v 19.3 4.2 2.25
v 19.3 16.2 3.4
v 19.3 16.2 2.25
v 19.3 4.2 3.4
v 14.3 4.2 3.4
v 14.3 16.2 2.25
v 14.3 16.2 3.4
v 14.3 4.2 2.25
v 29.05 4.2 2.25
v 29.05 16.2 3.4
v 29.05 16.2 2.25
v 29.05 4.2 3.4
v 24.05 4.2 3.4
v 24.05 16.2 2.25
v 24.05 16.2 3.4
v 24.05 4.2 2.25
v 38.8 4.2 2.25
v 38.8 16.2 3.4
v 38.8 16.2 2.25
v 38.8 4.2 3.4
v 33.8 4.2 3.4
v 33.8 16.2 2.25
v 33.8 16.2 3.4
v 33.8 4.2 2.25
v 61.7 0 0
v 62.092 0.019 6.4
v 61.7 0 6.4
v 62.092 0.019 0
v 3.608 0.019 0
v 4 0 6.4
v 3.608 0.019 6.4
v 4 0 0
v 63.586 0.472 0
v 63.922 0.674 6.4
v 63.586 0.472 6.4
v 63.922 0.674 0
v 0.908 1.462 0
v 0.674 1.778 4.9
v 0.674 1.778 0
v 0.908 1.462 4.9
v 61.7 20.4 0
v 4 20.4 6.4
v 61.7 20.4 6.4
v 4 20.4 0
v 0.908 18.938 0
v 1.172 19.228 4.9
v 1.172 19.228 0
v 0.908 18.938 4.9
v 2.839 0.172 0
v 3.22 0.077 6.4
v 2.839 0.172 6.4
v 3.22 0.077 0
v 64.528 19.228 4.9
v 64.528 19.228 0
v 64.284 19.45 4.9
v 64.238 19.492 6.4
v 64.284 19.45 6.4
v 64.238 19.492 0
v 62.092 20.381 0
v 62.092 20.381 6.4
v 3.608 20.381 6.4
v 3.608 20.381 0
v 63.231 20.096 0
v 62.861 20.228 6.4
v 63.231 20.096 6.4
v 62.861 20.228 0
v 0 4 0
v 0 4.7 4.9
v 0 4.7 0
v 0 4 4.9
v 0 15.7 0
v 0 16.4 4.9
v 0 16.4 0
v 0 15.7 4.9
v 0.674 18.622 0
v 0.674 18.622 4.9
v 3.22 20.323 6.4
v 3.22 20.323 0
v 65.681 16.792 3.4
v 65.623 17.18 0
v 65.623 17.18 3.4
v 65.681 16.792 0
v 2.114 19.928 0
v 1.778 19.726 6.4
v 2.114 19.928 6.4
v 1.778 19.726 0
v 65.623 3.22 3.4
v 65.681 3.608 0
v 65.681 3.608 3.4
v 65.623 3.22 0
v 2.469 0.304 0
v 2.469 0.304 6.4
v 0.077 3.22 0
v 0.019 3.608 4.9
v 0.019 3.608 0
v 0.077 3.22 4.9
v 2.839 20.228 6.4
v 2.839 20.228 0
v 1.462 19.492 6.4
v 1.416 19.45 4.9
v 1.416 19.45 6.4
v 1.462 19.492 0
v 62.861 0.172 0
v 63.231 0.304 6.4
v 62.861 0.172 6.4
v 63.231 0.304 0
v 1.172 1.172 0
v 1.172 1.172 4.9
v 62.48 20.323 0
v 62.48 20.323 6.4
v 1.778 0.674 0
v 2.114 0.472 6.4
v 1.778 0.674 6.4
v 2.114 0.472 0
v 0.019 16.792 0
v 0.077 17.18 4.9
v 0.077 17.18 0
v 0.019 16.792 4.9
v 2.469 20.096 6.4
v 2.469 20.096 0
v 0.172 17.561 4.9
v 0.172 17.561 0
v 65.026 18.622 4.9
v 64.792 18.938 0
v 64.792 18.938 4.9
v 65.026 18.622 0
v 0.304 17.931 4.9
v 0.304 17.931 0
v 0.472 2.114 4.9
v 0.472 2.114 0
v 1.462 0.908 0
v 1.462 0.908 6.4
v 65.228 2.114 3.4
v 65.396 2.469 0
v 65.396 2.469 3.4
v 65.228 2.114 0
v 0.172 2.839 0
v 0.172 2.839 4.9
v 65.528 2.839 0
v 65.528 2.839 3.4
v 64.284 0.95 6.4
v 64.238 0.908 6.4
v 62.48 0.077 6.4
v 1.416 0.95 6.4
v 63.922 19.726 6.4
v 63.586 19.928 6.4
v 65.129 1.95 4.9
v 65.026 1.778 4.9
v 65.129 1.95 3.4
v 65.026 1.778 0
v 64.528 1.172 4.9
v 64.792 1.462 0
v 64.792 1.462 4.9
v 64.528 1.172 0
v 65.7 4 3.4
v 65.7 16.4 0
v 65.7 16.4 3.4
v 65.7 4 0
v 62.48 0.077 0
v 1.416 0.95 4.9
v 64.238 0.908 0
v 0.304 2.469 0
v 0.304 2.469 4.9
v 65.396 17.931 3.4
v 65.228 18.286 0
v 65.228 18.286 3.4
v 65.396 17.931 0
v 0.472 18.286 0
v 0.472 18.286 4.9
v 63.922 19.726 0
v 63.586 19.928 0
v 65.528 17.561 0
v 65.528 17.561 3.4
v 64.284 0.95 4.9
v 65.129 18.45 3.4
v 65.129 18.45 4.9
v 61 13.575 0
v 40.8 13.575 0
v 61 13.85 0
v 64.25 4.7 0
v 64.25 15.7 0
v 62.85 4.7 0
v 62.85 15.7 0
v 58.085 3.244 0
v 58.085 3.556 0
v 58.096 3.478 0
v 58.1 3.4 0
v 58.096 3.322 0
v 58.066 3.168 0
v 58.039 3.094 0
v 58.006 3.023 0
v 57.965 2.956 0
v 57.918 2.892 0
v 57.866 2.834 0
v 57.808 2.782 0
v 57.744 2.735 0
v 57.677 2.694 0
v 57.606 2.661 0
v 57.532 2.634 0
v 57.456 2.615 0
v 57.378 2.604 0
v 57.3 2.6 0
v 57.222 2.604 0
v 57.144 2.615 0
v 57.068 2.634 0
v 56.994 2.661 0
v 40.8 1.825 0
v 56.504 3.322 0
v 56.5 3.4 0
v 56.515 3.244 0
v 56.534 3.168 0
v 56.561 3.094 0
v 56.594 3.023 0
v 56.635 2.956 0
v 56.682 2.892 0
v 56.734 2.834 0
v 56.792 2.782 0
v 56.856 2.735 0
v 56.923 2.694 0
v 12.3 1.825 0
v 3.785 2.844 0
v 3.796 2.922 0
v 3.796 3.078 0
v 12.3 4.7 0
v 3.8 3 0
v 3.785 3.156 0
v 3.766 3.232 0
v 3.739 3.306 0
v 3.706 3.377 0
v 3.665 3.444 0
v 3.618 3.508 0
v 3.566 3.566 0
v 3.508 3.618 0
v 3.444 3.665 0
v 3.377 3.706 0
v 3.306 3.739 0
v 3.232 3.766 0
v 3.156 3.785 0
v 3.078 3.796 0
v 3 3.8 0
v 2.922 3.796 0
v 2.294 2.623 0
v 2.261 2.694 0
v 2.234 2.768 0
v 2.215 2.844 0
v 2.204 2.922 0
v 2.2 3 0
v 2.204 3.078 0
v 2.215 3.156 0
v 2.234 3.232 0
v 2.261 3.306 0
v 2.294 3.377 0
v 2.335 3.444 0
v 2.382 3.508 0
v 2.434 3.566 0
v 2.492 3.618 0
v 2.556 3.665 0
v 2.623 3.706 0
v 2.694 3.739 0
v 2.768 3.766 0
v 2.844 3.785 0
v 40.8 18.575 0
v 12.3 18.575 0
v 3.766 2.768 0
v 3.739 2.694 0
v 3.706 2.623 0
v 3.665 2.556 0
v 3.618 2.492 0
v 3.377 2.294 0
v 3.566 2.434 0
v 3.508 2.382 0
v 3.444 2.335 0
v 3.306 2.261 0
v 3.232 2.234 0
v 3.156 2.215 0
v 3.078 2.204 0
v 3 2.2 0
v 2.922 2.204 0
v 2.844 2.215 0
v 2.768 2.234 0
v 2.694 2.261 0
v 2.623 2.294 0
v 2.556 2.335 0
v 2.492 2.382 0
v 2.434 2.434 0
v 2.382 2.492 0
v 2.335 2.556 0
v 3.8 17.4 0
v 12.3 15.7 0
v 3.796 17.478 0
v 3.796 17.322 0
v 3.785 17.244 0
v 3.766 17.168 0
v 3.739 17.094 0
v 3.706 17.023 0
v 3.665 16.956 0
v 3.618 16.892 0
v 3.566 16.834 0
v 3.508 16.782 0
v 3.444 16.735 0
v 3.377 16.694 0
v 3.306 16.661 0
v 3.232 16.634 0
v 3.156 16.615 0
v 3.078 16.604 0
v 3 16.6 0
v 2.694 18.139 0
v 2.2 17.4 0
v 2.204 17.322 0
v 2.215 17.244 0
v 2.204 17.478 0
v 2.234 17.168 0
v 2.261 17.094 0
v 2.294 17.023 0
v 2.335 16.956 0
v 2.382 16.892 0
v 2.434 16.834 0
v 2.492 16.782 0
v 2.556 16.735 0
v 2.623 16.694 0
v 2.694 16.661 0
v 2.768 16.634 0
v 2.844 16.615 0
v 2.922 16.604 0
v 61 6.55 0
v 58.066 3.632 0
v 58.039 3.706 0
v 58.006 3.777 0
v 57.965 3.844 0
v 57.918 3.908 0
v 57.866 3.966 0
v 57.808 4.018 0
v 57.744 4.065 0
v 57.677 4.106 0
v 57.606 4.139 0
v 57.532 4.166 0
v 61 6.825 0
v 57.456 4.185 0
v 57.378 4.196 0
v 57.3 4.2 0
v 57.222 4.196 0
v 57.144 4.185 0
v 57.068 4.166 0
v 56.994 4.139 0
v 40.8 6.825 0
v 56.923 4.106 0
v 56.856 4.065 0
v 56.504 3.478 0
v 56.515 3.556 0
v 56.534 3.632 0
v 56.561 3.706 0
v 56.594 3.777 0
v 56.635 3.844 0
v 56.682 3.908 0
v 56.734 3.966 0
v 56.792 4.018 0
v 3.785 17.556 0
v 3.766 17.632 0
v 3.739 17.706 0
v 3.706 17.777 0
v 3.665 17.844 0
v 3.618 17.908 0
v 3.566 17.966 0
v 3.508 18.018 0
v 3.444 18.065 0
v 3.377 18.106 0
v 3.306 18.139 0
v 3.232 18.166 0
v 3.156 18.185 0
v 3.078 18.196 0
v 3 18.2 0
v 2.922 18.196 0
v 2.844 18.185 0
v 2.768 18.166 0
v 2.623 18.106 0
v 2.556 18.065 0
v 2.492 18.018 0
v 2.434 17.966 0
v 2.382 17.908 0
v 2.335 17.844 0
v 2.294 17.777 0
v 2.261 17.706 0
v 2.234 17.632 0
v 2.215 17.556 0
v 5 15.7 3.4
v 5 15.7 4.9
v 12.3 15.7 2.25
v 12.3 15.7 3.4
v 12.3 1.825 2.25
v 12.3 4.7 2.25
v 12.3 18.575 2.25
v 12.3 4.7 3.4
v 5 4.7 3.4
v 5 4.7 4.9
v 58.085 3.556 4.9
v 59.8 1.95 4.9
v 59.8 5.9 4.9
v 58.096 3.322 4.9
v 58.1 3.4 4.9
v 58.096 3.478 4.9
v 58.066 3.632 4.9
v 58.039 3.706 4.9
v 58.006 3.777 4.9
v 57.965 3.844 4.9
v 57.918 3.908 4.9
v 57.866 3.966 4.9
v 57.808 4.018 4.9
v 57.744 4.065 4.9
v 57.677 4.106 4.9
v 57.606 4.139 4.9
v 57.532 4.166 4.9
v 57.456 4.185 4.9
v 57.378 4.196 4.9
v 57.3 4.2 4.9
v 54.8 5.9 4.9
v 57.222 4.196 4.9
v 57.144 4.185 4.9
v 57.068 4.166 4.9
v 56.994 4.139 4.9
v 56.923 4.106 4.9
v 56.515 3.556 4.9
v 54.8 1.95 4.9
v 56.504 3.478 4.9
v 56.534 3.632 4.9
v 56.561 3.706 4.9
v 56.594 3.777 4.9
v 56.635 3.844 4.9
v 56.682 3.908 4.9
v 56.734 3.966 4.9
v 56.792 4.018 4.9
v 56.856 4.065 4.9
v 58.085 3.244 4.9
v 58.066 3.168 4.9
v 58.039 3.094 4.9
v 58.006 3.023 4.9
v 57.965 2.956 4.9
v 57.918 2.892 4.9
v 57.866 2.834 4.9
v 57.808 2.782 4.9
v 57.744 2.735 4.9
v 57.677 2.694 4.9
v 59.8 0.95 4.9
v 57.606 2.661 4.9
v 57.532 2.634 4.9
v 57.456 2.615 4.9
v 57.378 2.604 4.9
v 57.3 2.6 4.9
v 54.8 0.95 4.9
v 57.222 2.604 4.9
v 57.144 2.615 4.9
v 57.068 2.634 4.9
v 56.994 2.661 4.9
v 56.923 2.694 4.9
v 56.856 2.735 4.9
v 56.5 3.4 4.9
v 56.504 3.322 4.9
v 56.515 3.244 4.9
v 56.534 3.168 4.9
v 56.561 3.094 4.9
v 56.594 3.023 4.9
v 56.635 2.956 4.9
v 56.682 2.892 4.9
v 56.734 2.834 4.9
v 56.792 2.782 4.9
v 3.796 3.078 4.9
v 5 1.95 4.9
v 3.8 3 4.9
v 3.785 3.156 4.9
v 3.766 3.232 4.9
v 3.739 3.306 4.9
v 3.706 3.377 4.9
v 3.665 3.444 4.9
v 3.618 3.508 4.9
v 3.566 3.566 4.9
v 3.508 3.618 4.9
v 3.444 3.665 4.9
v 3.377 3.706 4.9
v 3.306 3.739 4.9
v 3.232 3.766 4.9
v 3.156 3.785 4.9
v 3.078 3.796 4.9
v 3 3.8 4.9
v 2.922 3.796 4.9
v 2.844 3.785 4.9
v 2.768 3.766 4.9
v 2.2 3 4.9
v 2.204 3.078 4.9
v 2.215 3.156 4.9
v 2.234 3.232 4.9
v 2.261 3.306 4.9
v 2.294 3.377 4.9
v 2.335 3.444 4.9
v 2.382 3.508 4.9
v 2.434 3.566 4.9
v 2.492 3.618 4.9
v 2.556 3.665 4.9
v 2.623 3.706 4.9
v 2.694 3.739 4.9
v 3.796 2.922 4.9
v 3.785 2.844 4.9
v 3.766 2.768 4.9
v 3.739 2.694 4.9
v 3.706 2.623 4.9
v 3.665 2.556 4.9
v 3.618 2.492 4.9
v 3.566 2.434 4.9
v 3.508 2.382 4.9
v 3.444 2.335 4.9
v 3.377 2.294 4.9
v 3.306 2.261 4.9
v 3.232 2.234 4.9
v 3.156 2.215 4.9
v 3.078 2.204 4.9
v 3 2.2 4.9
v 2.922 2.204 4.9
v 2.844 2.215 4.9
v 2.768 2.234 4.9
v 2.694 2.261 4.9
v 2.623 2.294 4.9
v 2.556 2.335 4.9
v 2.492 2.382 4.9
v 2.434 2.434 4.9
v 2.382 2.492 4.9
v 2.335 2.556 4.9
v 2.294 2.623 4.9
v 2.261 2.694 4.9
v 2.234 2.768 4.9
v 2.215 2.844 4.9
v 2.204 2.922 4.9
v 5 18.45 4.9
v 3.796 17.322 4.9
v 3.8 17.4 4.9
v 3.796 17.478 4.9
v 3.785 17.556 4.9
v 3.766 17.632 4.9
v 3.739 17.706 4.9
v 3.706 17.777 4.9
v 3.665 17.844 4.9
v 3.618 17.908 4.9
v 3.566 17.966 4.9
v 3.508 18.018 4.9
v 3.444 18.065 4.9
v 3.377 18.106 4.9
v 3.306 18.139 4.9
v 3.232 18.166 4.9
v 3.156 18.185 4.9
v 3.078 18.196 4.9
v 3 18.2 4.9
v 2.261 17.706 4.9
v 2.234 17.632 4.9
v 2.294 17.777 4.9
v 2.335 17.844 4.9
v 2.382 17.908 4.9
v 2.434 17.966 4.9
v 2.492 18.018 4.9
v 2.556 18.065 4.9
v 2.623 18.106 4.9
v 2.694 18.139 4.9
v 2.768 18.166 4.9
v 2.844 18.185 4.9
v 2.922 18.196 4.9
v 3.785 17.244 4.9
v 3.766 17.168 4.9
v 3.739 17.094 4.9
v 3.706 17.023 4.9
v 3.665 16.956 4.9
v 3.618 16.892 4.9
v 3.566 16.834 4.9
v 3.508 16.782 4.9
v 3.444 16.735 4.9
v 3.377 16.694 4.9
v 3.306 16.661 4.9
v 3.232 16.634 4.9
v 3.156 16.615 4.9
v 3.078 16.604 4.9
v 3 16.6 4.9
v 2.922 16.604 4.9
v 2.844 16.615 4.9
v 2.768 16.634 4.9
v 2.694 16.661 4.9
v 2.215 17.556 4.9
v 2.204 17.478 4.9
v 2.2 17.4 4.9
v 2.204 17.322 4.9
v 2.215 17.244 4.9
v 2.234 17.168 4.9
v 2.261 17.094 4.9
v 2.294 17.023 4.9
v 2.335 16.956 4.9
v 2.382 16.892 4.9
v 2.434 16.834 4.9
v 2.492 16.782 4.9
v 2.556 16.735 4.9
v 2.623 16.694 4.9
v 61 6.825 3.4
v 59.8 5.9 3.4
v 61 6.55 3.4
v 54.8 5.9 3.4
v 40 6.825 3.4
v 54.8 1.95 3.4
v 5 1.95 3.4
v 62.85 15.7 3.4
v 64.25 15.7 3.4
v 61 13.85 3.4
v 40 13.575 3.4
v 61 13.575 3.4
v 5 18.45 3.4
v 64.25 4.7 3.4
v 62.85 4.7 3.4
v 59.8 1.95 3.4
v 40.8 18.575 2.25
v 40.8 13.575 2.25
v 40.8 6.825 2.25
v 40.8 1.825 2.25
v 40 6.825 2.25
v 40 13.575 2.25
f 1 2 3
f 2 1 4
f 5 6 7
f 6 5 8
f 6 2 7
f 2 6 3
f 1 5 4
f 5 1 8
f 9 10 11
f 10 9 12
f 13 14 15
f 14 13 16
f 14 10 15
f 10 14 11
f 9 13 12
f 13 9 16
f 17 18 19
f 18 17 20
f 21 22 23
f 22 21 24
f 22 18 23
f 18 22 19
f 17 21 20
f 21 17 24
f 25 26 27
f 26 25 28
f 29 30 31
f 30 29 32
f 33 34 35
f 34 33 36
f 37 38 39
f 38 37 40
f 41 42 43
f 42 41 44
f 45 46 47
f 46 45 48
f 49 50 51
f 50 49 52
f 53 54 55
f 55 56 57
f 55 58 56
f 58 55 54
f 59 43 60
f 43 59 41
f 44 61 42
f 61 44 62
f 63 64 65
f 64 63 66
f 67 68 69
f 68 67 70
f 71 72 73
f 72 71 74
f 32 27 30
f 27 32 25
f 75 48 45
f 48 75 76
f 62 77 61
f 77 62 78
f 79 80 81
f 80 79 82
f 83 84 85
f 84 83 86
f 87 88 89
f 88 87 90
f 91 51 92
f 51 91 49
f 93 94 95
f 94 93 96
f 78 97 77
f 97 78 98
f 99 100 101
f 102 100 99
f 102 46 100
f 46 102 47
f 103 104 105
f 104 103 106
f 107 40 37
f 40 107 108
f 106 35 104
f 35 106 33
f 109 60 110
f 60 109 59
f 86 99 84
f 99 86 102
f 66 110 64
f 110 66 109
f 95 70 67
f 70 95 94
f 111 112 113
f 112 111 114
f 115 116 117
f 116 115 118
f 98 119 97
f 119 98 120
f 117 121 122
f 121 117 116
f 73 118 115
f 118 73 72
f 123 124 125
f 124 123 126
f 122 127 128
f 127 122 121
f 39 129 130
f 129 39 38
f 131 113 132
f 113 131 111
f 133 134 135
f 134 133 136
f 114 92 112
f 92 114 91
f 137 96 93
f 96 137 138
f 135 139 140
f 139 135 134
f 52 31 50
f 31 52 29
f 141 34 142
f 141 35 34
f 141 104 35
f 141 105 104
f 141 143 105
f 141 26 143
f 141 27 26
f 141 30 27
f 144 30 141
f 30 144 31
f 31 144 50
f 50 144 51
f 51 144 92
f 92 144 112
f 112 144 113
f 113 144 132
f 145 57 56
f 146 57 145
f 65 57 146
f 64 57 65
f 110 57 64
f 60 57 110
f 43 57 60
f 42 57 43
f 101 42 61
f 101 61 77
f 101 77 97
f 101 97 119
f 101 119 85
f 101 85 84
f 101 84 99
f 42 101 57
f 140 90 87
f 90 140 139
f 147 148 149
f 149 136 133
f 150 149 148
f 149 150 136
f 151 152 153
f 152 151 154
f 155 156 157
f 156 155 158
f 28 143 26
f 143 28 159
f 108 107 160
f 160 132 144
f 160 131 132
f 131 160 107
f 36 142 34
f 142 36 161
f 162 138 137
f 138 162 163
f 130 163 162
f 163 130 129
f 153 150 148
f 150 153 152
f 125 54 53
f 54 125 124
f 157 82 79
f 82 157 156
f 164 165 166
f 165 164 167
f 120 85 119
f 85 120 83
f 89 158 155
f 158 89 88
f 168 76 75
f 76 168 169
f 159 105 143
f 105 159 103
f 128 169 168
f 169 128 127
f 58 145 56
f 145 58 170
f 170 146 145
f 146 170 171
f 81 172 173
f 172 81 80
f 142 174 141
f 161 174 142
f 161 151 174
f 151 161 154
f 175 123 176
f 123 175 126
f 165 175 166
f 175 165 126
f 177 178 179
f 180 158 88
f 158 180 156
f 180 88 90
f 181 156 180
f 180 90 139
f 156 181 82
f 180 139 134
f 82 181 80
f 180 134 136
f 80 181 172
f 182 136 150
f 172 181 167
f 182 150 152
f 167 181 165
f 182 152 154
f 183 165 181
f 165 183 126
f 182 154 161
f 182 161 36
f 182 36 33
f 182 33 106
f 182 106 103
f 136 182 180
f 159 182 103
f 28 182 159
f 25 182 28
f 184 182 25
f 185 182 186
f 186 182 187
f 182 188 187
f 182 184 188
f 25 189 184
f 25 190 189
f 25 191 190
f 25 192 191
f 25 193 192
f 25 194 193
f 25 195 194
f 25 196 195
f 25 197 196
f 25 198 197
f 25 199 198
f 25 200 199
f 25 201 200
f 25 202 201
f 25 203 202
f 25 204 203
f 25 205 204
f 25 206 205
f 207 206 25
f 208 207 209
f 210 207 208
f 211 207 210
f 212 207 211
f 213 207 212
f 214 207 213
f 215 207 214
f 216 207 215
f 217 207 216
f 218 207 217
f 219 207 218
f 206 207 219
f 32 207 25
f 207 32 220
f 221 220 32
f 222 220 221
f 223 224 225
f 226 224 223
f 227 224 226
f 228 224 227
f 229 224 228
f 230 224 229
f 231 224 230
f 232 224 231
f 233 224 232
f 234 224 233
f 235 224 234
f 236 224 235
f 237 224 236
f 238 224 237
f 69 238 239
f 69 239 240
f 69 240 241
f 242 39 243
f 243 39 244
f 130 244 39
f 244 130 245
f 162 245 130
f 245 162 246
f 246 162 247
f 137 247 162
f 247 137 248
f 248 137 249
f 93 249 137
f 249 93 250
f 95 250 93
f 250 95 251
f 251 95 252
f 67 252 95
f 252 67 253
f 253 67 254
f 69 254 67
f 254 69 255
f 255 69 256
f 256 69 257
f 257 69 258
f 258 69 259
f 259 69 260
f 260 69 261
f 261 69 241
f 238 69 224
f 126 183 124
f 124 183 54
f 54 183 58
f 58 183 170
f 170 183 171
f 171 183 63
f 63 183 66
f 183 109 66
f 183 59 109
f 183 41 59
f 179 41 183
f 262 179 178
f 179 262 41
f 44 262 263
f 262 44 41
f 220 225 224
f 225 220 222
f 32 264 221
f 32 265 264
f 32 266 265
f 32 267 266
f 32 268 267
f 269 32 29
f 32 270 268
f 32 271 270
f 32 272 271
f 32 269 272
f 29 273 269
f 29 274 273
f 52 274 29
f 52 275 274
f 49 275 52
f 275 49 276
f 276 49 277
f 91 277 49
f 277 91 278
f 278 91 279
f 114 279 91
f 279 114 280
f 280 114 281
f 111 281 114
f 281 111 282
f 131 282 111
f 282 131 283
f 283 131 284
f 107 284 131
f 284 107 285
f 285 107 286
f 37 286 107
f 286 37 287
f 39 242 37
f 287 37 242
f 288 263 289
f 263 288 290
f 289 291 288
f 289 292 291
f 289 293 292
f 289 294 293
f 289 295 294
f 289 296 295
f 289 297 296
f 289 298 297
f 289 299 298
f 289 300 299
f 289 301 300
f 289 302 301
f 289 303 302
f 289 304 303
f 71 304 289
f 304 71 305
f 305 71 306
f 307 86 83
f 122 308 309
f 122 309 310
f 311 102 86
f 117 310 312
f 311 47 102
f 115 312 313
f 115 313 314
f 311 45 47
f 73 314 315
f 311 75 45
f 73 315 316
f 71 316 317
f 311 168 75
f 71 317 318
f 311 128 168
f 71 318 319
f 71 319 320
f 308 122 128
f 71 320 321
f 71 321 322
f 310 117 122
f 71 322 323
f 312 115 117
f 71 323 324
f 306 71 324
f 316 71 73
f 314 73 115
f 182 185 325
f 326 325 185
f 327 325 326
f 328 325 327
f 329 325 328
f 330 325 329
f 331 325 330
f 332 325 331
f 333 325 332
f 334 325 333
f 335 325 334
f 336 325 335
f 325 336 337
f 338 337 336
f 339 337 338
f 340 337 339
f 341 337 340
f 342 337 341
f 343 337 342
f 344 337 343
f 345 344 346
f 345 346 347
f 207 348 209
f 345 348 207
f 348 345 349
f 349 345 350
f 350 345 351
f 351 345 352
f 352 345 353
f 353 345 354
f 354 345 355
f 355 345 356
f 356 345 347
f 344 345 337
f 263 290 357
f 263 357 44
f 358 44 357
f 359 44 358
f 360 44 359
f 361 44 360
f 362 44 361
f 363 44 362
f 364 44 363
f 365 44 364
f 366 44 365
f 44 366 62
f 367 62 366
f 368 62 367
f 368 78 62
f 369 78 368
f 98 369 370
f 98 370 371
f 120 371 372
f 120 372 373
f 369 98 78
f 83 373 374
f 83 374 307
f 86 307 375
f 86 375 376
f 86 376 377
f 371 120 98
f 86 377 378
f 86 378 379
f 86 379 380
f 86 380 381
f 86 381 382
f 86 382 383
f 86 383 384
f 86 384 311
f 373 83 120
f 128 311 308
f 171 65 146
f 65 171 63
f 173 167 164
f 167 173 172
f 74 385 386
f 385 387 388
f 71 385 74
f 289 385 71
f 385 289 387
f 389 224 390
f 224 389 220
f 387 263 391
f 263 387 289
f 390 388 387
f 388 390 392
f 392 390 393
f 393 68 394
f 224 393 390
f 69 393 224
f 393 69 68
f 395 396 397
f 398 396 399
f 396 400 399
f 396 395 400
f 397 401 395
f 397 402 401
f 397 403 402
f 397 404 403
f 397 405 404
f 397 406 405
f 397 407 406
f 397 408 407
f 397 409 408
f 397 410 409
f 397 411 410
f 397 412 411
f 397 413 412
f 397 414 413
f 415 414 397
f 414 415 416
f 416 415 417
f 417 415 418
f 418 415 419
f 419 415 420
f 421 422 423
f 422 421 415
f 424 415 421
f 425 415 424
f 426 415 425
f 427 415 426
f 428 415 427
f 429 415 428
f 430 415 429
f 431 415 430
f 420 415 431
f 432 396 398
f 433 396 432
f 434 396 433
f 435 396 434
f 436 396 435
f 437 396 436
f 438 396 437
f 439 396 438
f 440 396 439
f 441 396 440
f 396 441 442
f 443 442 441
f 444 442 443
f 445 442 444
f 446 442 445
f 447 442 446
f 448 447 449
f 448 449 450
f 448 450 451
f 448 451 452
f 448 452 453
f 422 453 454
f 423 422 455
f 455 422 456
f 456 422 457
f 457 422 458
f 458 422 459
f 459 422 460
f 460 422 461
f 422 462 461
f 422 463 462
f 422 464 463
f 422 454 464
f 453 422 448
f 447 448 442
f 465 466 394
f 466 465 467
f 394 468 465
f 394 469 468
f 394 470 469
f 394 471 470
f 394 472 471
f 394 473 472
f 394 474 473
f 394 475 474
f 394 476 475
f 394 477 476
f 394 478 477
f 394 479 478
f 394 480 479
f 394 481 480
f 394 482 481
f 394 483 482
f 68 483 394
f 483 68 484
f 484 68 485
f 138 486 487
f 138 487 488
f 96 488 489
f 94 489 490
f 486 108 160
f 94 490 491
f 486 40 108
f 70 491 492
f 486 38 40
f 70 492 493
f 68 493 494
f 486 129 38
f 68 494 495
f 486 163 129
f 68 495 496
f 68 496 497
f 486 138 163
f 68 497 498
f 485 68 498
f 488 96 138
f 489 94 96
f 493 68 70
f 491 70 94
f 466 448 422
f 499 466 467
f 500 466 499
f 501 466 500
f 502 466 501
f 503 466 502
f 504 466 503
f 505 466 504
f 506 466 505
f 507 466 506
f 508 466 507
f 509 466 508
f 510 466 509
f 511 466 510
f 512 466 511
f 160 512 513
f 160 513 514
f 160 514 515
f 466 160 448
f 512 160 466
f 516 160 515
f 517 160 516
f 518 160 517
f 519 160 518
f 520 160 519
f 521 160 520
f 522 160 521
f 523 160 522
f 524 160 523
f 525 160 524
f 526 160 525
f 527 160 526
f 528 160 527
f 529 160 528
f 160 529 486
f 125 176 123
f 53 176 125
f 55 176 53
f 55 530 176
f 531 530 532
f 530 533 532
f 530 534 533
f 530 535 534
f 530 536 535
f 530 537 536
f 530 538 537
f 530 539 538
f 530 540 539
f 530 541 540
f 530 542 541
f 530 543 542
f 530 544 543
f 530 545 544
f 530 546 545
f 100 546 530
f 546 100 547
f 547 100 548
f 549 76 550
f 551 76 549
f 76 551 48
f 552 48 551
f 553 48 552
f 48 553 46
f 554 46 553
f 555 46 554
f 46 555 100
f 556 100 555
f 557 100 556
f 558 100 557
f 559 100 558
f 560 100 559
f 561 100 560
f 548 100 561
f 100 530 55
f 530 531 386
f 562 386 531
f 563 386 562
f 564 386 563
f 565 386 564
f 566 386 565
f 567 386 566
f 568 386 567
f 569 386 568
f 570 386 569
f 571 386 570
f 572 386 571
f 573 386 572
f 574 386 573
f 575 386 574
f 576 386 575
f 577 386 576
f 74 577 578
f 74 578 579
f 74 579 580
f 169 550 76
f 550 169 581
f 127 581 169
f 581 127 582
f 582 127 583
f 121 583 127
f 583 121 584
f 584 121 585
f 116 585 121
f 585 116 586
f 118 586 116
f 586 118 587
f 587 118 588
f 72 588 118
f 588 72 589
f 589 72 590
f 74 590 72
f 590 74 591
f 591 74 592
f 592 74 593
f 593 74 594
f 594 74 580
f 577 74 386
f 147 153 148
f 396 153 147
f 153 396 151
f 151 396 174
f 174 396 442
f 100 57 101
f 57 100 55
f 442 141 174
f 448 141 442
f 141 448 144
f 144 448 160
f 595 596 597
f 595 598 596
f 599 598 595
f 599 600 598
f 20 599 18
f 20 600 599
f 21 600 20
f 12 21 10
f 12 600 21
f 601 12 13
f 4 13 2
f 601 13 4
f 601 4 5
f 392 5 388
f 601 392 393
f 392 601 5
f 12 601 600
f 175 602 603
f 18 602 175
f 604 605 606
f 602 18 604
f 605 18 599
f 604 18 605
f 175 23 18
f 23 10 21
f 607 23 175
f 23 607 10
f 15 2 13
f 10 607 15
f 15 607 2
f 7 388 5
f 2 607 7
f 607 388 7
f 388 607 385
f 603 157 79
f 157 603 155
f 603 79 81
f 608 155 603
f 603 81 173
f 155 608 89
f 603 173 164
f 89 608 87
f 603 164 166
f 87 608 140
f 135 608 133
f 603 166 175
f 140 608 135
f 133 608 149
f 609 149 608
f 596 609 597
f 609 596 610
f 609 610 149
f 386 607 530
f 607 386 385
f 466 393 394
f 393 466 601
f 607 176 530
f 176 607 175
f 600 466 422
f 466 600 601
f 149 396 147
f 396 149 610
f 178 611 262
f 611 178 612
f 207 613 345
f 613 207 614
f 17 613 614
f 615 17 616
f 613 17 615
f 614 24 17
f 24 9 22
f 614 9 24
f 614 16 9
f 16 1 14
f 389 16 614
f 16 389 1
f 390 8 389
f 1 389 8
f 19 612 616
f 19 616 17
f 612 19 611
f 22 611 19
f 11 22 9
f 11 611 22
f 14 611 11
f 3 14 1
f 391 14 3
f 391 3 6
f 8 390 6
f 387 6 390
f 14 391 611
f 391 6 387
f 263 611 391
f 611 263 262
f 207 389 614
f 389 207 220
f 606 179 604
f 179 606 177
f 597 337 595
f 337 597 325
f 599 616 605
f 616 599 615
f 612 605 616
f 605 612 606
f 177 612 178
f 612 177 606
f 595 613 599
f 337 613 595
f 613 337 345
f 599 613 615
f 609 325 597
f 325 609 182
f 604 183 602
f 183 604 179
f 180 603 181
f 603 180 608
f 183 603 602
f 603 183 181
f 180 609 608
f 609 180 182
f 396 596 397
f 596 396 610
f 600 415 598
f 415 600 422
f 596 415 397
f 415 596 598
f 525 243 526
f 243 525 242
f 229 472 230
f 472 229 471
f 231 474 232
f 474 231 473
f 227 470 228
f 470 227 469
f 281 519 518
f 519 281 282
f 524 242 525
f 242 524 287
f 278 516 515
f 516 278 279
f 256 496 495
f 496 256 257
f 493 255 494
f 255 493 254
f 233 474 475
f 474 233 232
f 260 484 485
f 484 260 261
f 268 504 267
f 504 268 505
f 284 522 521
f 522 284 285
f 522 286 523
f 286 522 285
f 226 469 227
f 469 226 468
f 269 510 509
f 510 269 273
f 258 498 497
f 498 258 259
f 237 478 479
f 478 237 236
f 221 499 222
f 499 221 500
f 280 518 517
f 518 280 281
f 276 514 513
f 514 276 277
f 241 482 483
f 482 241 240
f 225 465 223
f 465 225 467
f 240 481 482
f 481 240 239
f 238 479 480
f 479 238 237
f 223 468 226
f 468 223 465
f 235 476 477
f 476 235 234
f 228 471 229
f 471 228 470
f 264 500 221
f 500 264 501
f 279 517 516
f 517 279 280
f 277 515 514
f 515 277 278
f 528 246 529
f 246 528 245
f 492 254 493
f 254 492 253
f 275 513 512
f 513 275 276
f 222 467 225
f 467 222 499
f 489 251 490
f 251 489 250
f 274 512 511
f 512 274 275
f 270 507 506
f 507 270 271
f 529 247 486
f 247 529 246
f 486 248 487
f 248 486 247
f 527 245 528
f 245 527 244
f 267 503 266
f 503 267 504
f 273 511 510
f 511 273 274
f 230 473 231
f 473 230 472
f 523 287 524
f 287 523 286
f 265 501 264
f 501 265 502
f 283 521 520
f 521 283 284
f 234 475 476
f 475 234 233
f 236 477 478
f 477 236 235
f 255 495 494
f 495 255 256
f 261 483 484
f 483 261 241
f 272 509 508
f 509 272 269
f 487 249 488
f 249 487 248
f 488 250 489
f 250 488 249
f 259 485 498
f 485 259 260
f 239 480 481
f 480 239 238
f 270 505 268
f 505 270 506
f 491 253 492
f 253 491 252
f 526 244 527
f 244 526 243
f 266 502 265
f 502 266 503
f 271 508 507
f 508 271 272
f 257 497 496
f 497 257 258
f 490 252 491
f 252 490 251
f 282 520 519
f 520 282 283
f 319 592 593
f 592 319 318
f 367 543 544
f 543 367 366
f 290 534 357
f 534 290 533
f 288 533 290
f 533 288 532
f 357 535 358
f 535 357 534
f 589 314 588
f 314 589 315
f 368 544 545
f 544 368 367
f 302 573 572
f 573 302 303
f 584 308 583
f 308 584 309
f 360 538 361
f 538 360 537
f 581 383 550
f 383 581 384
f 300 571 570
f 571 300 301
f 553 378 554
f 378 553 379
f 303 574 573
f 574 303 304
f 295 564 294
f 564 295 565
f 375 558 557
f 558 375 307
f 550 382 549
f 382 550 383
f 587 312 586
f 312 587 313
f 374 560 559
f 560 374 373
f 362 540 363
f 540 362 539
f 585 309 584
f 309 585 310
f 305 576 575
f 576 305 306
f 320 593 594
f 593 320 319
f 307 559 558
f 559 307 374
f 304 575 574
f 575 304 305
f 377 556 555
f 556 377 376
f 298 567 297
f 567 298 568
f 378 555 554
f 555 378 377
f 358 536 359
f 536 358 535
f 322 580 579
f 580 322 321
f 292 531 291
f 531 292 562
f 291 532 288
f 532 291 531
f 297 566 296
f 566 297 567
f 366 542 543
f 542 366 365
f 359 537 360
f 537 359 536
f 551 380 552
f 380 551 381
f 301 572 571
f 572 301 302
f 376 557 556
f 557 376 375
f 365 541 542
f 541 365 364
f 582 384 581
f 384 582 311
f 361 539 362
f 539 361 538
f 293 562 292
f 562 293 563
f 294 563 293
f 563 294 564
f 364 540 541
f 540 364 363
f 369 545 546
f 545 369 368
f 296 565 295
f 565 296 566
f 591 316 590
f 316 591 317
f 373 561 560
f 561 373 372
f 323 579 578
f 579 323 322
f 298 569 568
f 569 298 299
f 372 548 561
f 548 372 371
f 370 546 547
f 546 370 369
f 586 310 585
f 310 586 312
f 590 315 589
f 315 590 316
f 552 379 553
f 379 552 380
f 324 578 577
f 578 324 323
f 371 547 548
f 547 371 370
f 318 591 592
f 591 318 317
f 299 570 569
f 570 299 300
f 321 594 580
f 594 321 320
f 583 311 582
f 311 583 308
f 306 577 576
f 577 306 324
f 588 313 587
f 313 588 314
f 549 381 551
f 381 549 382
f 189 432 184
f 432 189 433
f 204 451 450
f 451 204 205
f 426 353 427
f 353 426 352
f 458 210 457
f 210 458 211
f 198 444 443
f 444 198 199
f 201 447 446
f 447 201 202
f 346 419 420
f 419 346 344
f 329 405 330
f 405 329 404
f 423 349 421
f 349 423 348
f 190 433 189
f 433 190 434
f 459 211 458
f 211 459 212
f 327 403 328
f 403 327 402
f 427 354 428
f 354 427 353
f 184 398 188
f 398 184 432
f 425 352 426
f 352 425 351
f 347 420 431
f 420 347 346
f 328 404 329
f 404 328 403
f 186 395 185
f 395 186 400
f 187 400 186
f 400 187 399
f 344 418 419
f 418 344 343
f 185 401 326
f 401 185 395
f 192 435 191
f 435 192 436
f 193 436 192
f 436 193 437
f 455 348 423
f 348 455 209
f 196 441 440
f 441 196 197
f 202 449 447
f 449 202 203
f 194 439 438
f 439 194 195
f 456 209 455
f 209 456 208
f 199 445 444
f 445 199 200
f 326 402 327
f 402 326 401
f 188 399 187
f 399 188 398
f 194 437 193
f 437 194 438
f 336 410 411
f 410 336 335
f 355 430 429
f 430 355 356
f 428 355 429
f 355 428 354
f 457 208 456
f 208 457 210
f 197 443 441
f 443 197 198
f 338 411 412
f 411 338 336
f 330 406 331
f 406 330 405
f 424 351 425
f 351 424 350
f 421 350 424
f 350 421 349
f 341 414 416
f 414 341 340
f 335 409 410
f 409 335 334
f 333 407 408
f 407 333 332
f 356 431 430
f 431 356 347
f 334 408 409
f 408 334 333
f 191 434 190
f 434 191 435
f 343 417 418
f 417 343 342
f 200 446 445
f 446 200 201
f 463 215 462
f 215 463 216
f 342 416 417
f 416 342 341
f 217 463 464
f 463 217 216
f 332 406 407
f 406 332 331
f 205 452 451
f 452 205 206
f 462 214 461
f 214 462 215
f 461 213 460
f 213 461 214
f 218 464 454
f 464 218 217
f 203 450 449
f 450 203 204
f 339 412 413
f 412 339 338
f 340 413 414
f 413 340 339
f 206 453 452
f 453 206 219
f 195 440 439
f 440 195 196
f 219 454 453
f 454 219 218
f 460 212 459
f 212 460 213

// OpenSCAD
// file: lib/Triangles.scad
/*
Triangles.scad
 Author: Tim Koopman
 https://github.com/tkoopman/Delta-Diamond/blob/master/OpenSCAD/Triangles.scad

         angleCA
           /|\
        a / H \ c
         /  |  \
 angleAB ------- angleBC
            b

Standard Parameters
	center: true/false
		If true same as centerXYZ = [true, true, true]

	centerXYZ: Vector of 3 true/false values [CenterX, CenterY, CenterZ]
		center must be left undef

	height: The 3D height of the Triangle. Ignored if heights defined

	heights: Vector of 3 height values heights @ [angleAB, angleBC, angleCA]
		If CenterZ is true each height will be centered individually, this means
		the shape will be different depending on CenterZ. Most times you will want
		CenterZ to be true to get the shape most people want.
*/

/* 
Triangle
	a: Length of side a
	b: Length of side b
	angle: angle at point angleAB
*/
module Triangle(
			a, b, angle, height=1, heights=undef,
			center=undef, centerXYZ=[false,false,false])
{
	// Calculate Heights at each point
	heightAB = ((heights==undef) ? height : heights[0])/2;
	heightBC = ((heights==undef) ? height : heights[1])/2;
	heightCA = ((heights==undef) ? height : heights[2])/2;
	centerZ = (center || (center==undef && centerXYZ[2]))?0:max(heightAB,heightBC,heightCA);

	// Calculate Offsets for centering
	offsetX = (center || (center==undef && centerXYZ[0]))?((cos(angle)*a)+b)/3:0;
	offsetY = (center || (center==undef && centerXYZ[1]))?(sin(angle)*a)/3:0;
	
	pointAB1 = [-offsetX,-offsetY, centerZ-heightAB];
	pointAB2 = [-offsetX,-offsetY, centerZ+heightAB];
	pointBC1 = [b-offsetX,-offsetY, centerZ-heightBC];
	pointBC2 = [b-offsetX,-offsetY, centerZ+heightBC];
	pointCA1 = [(cos(angle)*a)-offsetX,(sin(angle)*a)-offsetY, centerZ-heightCA];
	pointCA2 = [(cos(angle)*a)-offsetX,(sin(angle)*a)-offsetY, centerZ+heightCA];

	polyhedron(
		points=[	pointAB1, pointBC1, pointCA1,
					pointAB2, pointBC2, pointCA2 ],
		triangles=[	
			[0, 1, 2],
			[3, 5, 4],
			[0, 3, 1],
			[1, 3, 4],
			[1, 4, 2],
			[2, 4, 5],
			[2, 5, 0],
			[0, 5, 3] ] );
}

/*
Isosceles Triangle
	Exactly 2 of the following paramaters must be defined.
	If all 3 defined H will be ignored.
	b: length of side b
	angle: angle at points angleAB & angleBC.
*/
module Isosceles_Triangle(
			b, angle, H=undef, height=1, heights=undef,
			center=undef, centerXYZ=[true, false, false])
{
	valid = 	(angle!=undef)?((angle < 90) && (b!=undef||H!=undef)) : (b!=undef&&H!=undef);
	ANGLE = (angle!=undef) ? angle : atan(H / (b/2));
	a = (b==undef)?(H/sin((180-(angle*2))/2)) : 
		 (b / cos(ANGLE))/2;
	B = (b==undef)? (cos(angle)*a)*2:b;
	if (valid)
	{
		Triangle(a=a, b=B, angle=ANGLE, height=height, heights=heights,
					center=center, centerXYZ=centerXYZ);
	} else {
		echo("Invalid Isosceles_Triangle. Must specify any 2 of b, angle and H, and if angle used angle must be less than 90");
	}
}

/*
Right Angled Triangle
	Create a Right Angled Triangle where the hypotenuse will be calculated.

       |\
      a| \
       |  \
       ----
         b
	a: length of side a
	b: length of side b
*/
module Right_Angled_Triangle(
			a, b, height=1, heights=undef,
			center=undef, centerXYZ=[false, false, false])
{
	Triangle(a=a, b=b, angle=90, height=height, heights=heights,
				center=center, centerXYZ=centerXYZ);
}

/*
Wedge
	Is same as Right Angled Triangle with 2 different heights, and rotated.
	Good for creating support structures.
*/
module Wedge(a, b, w1, w2)
{
	rotate([90,0,0])
		Right_Angled_Triangle(a, b, heights=[w1, w2, w1], centerXYZ=[false, false, true]);
}

/*
Equilateral Triangle
	Create a Equilateral Triangle.

	l: Length of all sides (a, b & c)
	H: Triangle size will be based on the this 2D height
		When using H, l is ignored.
*/
module Equilateral_Triangle(
			l=10, H=undef, height=1, heights=undef,
			center=undef, centerXYZ=[true,false,false])
{
	L = (H==undef)?l:H/sin(60);
	Triangle(a=L,b=L,angle=60,height=height, heights=heights,
				center=center, centerXYZ=centerXYZ);
}

/*
Trapezoid
	Create a Basic Trapezoid (Based on Isosceles_Triangle)

            d
          /----\
         /  |   \
     a  /   H    \ c
       /    |     \
 angle ------------ angle
            b

	b: Length of side b
	angle: Angle at points angleAB & angleBC
	H: The 2D height at which the triangle should be cut to create the trapezoid
	heights: If vector of size 3 (Standard for triangles) both cd & da will be the same height, if vector have 4 values [ab,bc,cd,da] than each point can have different heights.
*/
module Trapezoid(
			b, angle=60, H, height=1, heights=undef,
			center=undef, centerXYZ=[true,false,false])
{
	validAngle = (angle < 90);
	adX = H / tan(angle);

	// Calculate Heights at each point
	heightAB = ((heights==undef) ? height : heights[0])/2;
	heightBC = ((heights==undef) ? height : heights[1])/2;
	heightCD = ((heights==undef) ? height : heights[2])/2;
	heightDA = ((heights==undef) ? height : ((len(heights) > 3)?heights[3]:heights[2]))/2;

	// Centers
	centerX = (center || (center==undef && centerXYZ[0]))?0:b/2;
	centerY = (center || (center==undef && centerXYZ[1]))?0:H/2;
	centerZ = (center || (center==undef && centerXYZ[2]))?0:max(heightAB,heightBC,heightCD,heightDA);

	// Points
	y = H/2;
	bx = b/2;
	dx = (b-(adX*2))/2;

	pointAB1 = [centerX-bx, centerY-y, centerZ-heightAB];
	pointAB2 = [centerX-bx, centerY-y, centerZ+heightAB];
	pointBC1 = [centerX+bx, centerY-y, centerZ-heightBC];
	pointBC2 = [centerX+bx, centerY-y, centerZ+heightBC];
	pointCD1 = [centerX+dx, centerY+y, centerZ-heightCD];
	pointCD2 = [centerX+dx, centerY+y, centerZ+heightCD];
	pointDA1 = [centerX-dx, centerY+y, centerZ-heightDA];
	pointDA2 = [centerX-dx, centerY+y, centerZ+heightDA];

	validH = (adX < b/2);

	if (validAngle && validH)
	{
		polyhedron(
			points=[	pointAB1, pointBC1, pointCD1, pointDA1,
						pointAB2, pointBC2, pointCD2, pointDA2 ],
			triangles=[	
				[0, 1, 2],
				[0, 2, 3],
				[4, 6, 5],
				[4, 7, 6],
				[0, 4, 1],
				[1, 4, 5],
				[1, 5, 2],
				[2, 5, 6],
				[2, 6, 3],
				[3, 6, 7],
				[3, 7, 0],
				[0, 7, 4]	] );
	} else {
		if (!validAngle) echo("Trapezoid invalid, angle must be less than 90");
		else echo("Trapezoid invalid, H is larger than triangle");
	}
}


// Examples
//Triangle(a=5, b=15, angle=33, centerXYZ=[true,false,false]);
//translate([20,0,0]) Right_Angled_Triangle(a=5, b=20, centerXYZ=[false,true,false]);
//translate([45,0,0]) Wedge(a=5, b=20, w1=10, w2=5);
//translate([-20,0,0]) Trapezoid(b=20, angle=33, H=4, height=5, centerXYZ=[true,false,true]);
//
//translate([0,10,0]) Isosceles_Triangle(b=20, angle=33);
//translate([30,10,0]) Isosceles_Triangle(b=20, H=5);
//translate([-30,10,0]) Isosceles_Triangle(angle=33, H=5, center=true);
//
//translate([15,-25,0]) Equilateral_Triangle(l=20);
//translate([-15,-25,0]) Equilateral_Triangle(H=20);
// main file
$fn = 64;

include <lib/Triangles.scad>;

holder_dims = [65.7, 20.4, 6.4];
holder_rounding = 4;

top_cutout = [12.3, 11];

board_cutout = [65.7, 18.5, 1.5];

board_second_cutout = [65.7, 16.5, 1.5];

screen_cutout = [28.5, 16.75, 2.25];

screen_bridge_cutout = [5, 12, 5];

screen_inset = 2;

screen_bridge_offset = ((screen_cutout[0] - (screen_bridge_cutout[0] * 3)) / 2) - screen_inset;

button_cutout = [21, 6.75, 5];

usb_cutout = [1.85, 0, 5];

usb_second_cutout = [1.4, 11, 5];

screw_diameter = 1.6;

difference() {
union() {
    difference() {
        translate([holder_rounding, holder_rounding, 0]) linear_extrude(holder_dims[2]) offset(holder_rounding) square([holder_dims[0] - holder_rounding * 2, holder_dims[1] - holder_rounding * 2]);

        translate([0, (holder_dims[1] - top_cutout[1]) / 2, 0]) linear_extrude(holder_dims[2]) square(top_cutout);

        translate([0, (holder_dims[1] - board_cutout[1]) / 2, holder_dims[2] - board_cutout[2]]) cube(board_cutout);

        translate([5, (holder_dims[1] - board_second_cutout[1]) / 2, holder_dims[2] - board_cutout[2] - board_second_cutout[2]]) cube(board_second_cutout);

        translate([12.3, (holder_dims[1] - screen_cutout[1]) / 2, 0]) cube(screen_cutout);

        translate([40, (holder_dims[1] - button_cutout[1]) / 2, 0]) cube(button_cutout);

        translate([40 + button_cutout[0] + usb_cutout[0], (holder_dims[1] - usb_cutout[1]) / 2, 0]) rotate([0, 0, 90]) Trapezoid(b = 11, H = 1.85, height = 5, angle = 45);

        translate([40 + button_cutout[0] + usb_cutout[0], (holder_dims[1] - usb_second_cutout[1]) / 2, 0]) cube(usb_second_cutout);

        for (i = [0 : 2]) {
            translate([12.3 + screen_inset + ((screen_bridge_offset + screen_bridge_cutout[0]) * i), (holder_dims[1] - screen_bridge_cutout[1]) / 2, 0]) cube(screen_bridge_cutout);
        }
    }

    translate([57.3, 3.4, holder_dims[2] - board_cutout[2] - .75]) cube([5, 5, 1.5], center = true);
}
translate([3, 3, 0]) cylinder(d = screw_diameter, h = holder_dims[2]);

translate([3, holder_dims[1] - 3, 0]) cylinder(d = screw_diameter, h = holder_dims[2]);

translate([57.3, 3.4, 0]) cylinder(d = screw_diameter, h = holder_dims[2]);
}
